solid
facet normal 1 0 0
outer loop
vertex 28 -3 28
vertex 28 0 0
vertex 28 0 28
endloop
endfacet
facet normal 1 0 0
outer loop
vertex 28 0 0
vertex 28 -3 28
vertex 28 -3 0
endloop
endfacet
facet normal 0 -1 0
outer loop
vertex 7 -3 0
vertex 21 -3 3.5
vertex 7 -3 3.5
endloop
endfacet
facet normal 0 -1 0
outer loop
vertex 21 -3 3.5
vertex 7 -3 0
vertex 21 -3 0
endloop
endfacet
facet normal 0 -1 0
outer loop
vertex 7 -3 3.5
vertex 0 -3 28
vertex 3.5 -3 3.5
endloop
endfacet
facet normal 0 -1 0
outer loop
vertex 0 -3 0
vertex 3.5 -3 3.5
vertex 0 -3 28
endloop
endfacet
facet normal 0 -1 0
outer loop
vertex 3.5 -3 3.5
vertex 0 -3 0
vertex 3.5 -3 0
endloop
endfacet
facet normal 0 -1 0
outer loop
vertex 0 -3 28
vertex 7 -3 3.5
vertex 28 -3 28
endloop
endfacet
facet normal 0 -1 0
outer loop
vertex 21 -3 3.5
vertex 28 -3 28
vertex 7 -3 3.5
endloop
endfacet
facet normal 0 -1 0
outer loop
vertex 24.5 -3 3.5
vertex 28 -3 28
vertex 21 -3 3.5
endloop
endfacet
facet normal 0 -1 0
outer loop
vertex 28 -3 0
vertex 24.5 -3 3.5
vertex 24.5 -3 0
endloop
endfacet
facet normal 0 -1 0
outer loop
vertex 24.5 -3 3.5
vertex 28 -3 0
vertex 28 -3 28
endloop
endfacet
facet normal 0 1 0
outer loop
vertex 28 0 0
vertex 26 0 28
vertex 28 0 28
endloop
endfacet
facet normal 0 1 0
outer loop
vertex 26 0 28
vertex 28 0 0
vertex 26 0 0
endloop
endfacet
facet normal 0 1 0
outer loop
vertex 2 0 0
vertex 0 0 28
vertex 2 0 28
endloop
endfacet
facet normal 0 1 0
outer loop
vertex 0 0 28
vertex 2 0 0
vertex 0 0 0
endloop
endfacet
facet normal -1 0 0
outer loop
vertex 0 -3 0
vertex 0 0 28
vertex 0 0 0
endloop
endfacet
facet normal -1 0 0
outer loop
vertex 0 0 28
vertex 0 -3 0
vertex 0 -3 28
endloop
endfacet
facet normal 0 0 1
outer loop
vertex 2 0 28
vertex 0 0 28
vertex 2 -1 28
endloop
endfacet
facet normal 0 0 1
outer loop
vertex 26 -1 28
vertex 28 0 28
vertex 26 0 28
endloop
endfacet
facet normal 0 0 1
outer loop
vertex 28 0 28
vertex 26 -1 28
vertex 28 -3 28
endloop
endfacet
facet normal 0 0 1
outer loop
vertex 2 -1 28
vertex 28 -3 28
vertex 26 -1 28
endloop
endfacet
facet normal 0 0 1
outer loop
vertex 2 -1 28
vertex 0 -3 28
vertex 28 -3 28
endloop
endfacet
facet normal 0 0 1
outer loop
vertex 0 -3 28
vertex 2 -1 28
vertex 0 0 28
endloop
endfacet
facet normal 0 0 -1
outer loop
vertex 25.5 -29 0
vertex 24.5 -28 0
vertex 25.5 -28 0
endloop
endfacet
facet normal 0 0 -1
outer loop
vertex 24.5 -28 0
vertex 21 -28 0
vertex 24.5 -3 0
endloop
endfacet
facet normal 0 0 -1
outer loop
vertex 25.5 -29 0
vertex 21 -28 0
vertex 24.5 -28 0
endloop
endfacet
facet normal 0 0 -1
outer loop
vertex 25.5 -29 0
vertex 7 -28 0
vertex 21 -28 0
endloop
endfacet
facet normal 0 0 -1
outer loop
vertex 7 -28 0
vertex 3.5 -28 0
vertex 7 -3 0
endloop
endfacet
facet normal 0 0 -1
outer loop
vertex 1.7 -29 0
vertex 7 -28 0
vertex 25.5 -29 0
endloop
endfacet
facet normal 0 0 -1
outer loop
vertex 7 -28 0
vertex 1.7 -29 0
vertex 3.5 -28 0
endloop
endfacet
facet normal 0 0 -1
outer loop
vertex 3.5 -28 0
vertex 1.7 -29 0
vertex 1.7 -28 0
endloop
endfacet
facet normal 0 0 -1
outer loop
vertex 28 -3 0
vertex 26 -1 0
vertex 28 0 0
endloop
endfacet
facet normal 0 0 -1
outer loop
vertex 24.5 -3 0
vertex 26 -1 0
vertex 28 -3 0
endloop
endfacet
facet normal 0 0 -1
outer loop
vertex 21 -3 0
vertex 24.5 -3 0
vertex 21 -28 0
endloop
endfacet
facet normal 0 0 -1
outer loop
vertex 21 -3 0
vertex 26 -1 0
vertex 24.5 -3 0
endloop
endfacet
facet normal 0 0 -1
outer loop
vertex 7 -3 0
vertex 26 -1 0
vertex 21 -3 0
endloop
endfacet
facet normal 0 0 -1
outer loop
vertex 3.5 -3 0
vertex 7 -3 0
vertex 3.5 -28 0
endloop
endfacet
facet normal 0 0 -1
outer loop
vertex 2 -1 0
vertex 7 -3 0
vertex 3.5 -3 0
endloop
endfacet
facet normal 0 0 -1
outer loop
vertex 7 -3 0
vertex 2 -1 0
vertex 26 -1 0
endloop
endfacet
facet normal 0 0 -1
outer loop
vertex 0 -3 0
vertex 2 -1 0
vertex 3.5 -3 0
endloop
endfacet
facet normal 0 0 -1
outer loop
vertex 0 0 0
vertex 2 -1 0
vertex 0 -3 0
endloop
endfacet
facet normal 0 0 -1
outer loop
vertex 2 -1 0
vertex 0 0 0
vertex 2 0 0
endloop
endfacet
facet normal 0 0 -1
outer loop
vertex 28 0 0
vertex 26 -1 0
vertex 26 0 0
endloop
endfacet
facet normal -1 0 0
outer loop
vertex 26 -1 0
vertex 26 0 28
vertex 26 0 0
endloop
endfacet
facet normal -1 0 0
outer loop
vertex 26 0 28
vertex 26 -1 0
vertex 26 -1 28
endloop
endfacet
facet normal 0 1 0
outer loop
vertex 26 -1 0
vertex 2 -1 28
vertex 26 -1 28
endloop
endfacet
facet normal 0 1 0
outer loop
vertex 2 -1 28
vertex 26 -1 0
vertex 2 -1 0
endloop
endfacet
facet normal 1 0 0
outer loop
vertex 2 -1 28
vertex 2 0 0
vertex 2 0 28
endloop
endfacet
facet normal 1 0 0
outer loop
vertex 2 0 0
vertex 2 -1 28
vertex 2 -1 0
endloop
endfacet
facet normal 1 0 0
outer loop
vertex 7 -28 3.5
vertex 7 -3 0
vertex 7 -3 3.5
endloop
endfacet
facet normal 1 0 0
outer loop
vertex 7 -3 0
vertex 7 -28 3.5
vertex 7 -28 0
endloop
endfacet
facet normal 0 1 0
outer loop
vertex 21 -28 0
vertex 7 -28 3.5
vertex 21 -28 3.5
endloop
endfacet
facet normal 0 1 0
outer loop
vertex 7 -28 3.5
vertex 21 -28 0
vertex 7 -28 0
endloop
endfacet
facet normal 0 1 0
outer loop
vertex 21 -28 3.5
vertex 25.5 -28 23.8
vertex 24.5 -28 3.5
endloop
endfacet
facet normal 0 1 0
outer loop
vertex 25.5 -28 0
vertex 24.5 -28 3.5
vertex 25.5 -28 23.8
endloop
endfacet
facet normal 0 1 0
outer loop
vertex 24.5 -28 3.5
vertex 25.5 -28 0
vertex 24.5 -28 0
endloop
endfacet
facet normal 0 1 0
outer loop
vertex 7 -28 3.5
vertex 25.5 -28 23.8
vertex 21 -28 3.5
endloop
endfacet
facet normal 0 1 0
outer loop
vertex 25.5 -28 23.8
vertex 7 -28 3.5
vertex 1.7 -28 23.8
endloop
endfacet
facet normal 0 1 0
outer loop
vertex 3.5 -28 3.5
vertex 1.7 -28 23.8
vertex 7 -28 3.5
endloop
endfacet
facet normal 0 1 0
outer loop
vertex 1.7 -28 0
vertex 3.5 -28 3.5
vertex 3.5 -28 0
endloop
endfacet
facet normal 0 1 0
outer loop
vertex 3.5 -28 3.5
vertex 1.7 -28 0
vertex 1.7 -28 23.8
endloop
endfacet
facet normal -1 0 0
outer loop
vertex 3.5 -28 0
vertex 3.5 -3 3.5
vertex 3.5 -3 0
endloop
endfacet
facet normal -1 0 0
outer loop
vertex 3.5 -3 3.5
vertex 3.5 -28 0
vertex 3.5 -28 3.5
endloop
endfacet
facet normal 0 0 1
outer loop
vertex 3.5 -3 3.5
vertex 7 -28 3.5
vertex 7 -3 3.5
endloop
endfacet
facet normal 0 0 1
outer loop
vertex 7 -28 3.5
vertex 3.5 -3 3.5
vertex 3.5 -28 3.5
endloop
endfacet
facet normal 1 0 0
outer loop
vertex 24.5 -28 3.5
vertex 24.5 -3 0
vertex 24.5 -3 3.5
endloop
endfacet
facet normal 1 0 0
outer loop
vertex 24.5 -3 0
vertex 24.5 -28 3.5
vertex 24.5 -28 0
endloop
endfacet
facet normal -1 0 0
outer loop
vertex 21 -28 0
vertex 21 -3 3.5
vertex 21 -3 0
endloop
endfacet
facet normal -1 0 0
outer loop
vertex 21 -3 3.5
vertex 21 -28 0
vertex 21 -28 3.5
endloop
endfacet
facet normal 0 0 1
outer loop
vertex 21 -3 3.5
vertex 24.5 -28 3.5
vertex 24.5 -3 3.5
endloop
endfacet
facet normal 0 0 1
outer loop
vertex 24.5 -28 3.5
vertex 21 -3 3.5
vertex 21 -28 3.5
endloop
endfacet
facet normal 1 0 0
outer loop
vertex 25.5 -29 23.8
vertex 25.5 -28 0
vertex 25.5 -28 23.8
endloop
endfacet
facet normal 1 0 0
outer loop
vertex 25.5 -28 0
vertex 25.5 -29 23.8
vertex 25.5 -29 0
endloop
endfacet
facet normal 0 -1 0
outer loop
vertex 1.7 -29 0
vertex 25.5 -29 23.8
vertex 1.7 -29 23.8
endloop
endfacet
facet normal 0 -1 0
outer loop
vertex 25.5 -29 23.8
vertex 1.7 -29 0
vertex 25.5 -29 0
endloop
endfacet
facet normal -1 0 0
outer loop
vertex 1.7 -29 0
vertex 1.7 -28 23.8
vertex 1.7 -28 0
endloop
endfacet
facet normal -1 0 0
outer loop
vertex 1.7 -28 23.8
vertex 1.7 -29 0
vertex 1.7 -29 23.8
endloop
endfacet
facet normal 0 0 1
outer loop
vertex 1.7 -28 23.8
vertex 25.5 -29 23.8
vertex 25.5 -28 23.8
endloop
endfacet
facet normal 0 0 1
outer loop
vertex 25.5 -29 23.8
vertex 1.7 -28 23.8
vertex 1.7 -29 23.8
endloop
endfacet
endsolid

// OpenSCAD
BASE_SIZE=28; // 28mm models
MODULE_HEIGHT=BASE_SIZE; 
FLOOR_THICKNESS=3;
FLOOR_WALL=2;
SPACE=0.1;
PILLAR_SIDE=BASE_SIZE/8;


module pillar(side=PILLAR_SIDE,unit=BASE_SIZE,height=MODULE_HEIGHT){
    tick_height=0.2;
    difference(){
    cube([side,side,height]);
    if(height>unit){
        for(i=[0:unit:height]){
            translate([-0.1,side-(side/10),i])cube([side+0.3,(side/10)*2,tick_height]);
        }
    }
    }
    
}

module platform(width=BASE_SIZE,length=BASE_SIZE,floor_height=FLOOR_THICKNESS,height=BASE_SIZE,floor_wall=FLOOR_WALL,pillar_side=PILLAR_SIDE){
    
    //FLOOR
    difference(){
        cube([width,length,floor_height]);
        translate([floor_wall,-floor_wall,-0.1])cube([width-floor_wall*2,length+floor_wall*3,floor_height-floor_wall+0.1]);
    }
    
    
    // Pillar
    translate([pillar_side,0,floor_height])pillar(side=pillar_side,height=height-floor_height);
    translate([width-pillar_side*2,0,floor_height])pillar(side=pillar_side,height=height-floor_height);
    
    // ROOF
    translate([pillar_side-floor_wall+SPACE*2,0,height])cube([width-(floor_wall+SPACE)*2,length-(floor_wall+SPACE)*2,floor_height-floor_wall]);
}


units=1;

rotate([90,0,0])platform(height=BASE_SIZE*units);
